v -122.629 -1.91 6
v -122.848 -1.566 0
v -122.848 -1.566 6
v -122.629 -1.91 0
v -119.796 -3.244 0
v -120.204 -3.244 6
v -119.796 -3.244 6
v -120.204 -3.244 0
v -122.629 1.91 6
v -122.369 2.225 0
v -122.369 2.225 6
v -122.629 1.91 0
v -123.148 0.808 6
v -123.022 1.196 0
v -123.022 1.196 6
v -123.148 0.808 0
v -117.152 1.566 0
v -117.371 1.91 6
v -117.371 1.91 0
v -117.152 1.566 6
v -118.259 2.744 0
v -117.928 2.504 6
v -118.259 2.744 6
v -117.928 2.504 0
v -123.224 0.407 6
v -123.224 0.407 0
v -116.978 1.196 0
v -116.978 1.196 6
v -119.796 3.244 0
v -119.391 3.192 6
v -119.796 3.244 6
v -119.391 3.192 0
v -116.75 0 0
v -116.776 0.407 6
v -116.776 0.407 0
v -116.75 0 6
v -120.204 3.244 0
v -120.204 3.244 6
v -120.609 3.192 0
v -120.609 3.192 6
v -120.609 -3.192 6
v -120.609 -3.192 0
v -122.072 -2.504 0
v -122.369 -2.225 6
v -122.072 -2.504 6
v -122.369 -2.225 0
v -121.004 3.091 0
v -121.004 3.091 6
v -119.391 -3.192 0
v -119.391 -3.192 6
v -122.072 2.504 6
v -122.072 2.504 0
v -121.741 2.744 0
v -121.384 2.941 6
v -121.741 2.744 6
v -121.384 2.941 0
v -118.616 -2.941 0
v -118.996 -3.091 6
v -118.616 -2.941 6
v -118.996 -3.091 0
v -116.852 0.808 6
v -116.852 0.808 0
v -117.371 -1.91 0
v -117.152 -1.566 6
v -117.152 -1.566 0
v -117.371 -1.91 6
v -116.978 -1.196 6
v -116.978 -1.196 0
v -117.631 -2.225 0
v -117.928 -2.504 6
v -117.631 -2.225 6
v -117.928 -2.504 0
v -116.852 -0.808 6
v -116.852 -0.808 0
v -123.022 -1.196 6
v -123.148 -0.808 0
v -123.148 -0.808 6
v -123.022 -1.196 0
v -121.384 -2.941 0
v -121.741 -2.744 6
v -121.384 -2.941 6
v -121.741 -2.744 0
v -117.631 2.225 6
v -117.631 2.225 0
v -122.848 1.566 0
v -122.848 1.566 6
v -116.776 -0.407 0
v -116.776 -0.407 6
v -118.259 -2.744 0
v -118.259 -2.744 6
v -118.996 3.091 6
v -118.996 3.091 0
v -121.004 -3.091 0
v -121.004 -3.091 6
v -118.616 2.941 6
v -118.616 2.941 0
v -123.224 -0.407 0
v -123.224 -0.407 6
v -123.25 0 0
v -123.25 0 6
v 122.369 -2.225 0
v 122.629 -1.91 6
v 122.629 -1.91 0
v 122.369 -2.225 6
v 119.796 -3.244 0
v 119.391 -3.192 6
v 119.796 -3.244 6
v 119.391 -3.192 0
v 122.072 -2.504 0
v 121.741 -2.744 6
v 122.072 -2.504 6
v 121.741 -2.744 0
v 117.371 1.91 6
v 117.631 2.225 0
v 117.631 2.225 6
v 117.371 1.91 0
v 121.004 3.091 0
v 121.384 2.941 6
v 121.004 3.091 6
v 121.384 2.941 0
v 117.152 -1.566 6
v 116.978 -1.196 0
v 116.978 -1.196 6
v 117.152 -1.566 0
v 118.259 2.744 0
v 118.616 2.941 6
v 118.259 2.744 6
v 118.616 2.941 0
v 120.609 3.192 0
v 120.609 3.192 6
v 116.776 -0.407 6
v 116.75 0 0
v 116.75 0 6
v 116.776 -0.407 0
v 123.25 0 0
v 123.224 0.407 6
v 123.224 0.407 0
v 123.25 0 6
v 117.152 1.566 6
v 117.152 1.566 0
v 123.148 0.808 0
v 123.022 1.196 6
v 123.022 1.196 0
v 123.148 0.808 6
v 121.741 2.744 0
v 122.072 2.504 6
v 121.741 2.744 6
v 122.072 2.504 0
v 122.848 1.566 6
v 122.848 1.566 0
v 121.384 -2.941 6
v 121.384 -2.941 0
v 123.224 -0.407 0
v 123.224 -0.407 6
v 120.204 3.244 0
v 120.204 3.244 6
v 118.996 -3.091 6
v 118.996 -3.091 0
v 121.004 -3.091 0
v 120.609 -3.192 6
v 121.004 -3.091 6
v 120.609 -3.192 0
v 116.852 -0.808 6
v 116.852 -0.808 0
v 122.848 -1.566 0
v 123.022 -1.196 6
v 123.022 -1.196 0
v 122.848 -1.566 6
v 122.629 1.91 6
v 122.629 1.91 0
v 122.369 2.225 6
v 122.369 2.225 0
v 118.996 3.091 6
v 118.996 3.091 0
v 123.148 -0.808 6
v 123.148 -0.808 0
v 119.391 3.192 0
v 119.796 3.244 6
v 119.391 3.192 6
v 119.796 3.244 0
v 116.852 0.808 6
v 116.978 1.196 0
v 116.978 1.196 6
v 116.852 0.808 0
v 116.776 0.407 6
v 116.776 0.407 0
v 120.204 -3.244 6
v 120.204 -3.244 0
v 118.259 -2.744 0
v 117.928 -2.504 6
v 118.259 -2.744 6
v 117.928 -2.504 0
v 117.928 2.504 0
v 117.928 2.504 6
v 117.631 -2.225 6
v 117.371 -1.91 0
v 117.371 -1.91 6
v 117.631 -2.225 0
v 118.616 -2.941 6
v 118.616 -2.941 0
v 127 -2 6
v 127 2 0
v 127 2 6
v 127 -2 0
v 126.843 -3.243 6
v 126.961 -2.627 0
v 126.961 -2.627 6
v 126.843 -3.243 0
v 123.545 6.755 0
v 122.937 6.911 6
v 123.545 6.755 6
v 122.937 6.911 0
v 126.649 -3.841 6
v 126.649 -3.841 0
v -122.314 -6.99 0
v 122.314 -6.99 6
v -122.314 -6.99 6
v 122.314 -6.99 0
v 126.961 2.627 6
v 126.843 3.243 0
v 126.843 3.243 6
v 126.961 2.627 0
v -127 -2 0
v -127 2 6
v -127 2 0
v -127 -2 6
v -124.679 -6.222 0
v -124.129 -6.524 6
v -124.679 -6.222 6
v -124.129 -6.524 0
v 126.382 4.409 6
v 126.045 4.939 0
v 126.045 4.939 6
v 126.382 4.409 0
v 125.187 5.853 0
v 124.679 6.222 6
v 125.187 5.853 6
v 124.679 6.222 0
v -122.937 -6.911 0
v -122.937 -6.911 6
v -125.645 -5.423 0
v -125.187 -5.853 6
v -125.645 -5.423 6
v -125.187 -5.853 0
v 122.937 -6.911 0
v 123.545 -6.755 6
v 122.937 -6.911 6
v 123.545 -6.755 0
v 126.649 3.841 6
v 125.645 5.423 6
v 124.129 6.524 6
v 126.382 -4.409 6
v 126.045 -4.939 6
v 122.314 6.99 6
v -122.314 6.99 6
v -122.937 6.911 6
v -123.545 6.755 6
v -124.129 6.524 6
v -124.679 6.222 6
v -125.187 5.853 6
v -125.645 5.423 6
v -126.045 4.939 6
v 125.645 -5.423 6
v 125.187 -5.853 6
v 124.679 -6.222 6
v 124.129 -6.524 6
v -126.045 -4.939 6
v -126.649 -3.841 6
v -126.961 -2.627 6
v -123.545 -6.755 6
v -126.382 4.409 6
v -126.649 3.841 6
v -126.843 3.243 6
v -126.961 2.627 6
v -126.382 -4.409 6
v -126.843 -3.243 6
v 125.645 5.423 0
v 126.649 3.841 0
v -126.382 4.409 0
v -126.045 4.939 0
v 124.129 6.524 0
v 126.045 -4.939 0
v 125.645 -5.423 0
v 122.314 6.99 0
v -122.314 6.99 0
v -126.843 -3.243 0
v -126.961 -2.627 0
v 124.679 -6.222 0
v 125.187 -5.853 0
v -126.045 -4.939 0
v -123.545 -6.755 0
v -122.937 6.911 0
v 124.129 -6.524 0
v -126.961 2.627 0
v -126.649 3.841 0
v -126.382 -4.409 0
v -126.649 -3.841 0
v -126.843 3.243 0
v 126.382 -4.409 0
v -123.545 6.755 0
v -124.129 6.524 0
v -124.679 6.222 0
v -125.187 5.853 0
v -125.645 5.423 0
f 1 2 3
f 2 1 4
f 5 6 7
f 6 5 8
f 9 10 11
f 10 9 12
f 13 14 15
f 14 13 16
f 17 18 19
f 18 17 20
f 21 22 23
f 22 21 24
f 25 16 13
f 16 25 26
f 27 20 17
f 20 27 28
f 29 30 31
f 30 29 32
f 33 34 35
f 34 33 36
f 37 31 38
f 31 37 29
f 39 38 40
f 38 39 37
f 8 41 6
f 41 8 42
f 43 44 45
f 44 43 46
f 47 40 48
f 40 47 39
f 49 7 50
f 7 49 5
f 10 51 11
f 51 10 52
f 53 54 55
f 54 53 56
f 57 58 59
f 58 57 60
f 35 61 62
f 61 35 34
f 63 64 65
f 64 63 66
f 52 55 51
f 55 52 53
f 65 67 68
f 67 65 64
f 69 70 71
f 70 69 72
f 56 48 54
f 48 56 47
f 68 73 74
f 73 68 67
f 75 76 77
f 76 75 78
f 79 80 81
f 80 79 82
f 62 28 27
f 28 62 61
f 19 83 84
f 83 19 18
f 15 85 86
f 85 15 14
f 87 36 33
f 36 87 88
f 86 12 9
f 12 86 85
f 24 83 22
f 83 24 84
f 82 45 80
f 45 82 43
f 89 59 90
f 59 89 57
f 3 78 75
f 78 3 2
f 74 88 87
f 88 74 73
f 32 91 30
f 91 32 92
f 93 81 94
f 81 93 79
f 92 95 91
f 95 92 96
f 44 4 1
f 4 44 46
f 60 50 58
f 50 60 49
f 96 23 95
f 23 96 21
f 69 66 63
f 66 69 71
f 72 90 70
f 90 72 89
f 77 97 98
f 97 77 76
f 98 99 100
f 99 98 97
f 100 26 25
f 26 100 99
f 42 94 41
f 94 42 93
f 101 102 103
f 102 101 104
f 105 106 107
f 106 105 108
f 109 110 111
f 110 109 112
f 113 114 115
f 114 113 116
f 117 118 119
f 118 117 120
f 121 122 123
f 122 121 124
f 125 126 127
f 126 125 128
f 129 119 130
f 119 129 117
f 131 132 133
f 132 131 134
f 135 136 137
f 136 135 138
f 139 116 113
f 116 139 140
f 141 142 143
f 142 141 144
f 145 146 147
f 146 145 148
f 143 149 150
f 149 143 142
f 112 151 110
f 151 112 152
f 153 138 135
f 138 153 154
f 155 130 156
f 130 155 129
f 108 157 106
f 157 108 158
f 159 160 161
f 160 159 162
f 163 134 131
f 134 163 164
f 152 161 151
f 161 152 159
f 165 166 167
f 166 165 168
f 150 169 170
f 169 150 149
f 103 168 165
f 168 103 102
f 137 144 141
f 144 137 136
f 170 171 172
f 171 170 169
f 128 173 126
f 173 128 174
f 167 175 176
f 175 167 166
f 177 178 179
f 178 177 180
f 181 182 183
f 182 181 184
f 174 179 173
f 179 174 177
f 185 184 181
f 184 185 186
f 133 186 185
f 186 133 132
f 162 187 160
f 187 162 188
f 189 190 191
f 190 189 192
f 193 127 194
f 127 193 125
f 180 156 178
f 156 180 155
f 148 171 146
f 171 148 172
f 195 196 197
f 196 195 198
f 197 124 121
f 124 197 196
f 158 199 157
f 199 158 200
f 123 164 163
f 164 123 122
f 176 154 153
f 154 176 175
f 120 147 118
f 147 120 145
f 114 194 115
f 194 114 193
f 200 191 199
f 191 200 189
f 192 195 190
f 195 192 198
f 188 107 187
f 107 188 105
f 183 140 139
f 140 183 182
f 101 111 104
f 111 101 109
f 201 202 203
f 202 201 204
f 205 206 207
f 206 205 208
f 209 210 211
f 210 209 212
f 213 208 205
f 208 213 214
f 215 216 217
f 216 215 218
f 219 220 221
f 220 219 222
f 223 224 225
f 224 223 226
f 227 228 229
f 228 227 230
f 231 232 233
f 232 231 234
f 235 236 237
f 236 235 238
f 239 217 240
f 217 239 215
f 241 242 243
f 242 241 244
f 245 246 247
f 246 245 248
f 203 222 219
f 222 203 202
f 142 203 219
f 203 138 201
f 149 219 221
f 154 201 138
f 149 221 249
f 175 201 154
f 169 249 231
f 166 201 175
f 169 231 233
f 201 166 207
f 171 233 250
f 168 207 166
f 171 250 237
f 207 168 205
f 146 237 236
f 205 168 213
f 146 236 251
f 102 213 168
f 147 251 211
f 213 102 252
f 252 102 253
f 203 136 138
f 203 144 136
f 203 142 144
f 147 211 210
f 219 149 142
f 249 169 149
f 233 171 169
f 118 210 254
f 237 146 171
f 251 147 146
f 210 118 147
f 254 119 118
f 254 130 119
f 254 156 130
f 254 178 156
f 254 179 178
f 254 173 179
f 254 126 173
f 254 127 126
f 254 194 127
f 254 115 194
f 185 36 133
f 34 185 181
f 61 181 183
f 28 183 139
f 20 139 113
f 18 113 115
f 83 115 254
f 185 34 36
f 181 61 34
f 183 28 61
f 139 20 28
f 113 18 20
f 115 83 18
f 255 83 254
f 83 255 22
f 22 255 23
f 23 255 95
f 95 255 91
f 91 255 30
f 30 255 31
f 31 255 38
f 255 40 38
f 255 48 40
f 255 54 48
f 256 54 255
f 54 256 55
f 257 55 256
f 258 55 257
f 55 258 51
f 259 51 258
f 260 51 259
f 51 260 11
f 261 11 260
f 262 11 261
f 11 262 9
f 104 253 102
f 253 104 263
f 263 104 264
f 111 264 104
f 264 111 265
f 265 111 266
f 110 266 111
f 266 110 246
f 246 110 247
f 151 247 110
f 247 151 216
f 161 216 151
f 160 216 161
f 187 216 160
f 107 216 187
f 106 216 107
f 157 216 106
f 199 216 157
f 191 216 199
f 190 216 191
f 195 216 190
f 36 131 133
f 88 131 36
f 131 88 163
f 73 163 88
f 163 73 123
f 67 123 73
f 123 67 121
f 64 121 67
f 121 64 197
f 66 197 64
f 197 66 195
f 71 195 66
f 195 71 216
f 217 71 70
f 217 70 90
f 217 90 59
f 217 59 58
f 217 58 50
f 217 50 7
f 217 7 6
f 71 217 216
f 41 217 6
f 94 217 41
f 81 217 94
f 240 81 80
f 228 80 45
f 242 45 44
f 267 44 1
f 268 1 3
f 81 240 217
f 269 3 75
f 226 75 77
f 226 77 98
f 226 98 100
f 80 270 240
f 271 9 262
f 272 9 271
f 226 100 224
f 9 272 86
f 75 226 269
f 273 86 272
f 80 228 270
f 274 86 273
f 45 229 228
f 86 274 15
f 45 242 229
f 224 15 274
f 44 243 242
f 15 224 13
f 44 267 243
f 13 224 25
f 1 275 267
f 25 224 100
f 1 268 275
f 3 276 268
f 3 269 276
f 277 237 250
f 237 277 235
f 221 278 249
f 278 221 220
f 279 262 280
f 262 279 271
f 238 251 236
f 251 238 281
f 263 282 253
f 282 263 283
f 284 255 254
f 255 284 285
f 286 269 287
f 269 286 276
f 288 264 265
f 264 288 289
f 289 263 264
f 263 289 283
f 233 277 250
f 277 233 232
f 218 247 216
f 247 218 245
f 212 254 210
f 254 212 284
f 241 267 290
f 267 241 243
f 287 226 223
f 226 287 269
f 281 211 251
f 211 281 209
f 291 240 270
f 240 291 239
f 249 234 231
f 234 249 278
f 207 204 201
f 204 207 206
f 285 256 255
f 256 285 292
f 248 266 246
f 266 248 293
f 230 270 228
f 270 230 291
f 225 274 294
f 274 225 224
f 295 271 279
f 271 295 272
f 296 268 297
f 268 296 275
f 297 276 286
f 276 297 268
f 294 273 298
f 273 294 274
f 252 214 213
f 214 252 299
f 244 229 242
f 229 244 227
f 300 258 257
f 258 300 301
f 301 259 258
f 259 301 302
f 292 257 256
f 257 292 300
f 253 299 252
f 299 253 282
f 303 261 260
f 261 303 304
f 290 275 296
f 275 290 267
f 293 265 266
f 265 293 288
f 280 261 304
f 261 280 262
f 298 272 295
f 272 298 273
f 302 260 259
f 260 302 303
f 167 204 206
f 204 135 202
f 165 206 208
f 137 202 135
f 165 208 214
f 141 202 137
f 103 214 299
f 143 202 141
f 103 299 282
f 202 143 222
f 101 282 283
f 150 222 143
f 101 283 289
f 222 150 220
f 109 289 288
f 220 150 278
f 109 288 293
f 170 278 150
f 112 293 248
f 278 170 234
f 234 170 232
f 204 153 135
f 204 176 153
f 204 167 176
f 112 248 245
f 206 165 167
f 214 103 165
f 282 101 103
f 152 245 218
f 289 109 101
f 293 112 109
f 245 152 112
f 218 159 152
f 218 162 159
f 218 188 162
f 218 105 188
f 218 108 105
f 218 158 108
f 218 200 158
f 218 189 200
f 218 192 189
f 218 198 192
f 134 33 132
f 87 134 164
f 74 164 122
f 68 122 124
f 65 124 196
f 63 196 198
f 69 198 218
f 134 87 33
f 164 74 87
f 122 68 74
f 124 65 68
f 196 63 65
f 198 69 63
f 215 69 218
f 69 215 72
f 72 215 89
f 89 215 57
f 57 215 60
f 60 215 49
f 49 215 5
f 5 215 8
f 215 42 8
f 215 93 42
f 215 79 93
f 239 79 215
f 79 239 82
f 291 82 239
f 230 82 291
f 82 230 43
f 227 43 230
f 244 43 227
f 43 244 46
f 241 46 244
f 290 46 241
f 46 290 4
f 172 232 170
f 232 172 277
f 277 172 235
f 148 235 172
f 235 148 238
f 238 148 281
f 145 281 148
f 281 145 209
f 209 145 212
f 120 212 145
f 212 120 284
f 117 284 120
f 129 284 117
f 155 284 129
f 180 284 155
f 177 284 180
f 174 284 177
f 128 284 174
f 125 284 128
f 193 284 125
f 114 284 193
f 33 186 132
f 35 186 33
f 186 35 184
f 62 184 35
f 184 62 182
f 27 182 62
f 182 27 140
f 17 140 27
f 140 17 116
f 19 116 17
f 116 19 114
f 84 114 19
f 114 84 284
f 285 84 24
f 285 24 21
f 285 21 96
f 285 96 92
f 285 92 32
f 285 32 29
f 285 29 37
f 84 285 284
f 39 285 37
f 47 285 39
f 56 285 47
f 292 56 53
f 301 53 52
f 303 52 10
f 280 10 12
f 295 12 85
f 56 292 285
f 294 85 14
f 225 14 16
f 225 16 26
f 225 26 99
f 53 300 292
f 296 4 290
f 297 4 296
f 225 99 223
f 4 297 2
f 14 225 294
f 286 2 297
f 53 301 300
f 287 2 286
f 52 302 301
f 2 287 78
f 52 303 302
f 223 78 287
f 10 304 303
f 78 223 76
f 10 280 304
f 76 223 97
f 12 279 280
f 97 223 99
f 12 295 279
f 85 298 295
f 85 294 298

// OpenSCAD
$fn = 50;


difference() {
	union() {
		hull() {
			translate(v = [-122.0000000000, 2.0000000000, 0]) {
				cylinder(h = 6, r = 5);
			}
			translate(v = [122.0000000000, 2.0000000000, 0]) {
				cylinder(h = 6, r = 5);
			}
			translate(v = [-122.0000000000, -2.0000000000, 0]) {
				cylinder(h = 6, r = 5);
			}
			translate(v = [122.0000000000, -2.0000000000, 0]) {
				cylinder(h = 6, r = 5);
			}
		}
	}
	union() {
		translate(v = [-120.0000000000, 0.0000000000, -100.0000000000]) {
			cylinder(h = 200, r = 3.2500000000);
		}
		translate(v = [-120.0000000000, 0.0000000000, -100.0000000000]) {
			cylinder(h = 200, r = 3.2500000000);
		}
		translate(v = [120.0000000000, 0.0000000000, -100.0000000000]) {
			cylinder(h = 200, r = 3.2500000000);
		}
		translate(v = [120.0000000000, 0.0000000000, -100.0000000000]) {
			cylinder(h = 200, r = 3.2500000000);
		}
	}
}
